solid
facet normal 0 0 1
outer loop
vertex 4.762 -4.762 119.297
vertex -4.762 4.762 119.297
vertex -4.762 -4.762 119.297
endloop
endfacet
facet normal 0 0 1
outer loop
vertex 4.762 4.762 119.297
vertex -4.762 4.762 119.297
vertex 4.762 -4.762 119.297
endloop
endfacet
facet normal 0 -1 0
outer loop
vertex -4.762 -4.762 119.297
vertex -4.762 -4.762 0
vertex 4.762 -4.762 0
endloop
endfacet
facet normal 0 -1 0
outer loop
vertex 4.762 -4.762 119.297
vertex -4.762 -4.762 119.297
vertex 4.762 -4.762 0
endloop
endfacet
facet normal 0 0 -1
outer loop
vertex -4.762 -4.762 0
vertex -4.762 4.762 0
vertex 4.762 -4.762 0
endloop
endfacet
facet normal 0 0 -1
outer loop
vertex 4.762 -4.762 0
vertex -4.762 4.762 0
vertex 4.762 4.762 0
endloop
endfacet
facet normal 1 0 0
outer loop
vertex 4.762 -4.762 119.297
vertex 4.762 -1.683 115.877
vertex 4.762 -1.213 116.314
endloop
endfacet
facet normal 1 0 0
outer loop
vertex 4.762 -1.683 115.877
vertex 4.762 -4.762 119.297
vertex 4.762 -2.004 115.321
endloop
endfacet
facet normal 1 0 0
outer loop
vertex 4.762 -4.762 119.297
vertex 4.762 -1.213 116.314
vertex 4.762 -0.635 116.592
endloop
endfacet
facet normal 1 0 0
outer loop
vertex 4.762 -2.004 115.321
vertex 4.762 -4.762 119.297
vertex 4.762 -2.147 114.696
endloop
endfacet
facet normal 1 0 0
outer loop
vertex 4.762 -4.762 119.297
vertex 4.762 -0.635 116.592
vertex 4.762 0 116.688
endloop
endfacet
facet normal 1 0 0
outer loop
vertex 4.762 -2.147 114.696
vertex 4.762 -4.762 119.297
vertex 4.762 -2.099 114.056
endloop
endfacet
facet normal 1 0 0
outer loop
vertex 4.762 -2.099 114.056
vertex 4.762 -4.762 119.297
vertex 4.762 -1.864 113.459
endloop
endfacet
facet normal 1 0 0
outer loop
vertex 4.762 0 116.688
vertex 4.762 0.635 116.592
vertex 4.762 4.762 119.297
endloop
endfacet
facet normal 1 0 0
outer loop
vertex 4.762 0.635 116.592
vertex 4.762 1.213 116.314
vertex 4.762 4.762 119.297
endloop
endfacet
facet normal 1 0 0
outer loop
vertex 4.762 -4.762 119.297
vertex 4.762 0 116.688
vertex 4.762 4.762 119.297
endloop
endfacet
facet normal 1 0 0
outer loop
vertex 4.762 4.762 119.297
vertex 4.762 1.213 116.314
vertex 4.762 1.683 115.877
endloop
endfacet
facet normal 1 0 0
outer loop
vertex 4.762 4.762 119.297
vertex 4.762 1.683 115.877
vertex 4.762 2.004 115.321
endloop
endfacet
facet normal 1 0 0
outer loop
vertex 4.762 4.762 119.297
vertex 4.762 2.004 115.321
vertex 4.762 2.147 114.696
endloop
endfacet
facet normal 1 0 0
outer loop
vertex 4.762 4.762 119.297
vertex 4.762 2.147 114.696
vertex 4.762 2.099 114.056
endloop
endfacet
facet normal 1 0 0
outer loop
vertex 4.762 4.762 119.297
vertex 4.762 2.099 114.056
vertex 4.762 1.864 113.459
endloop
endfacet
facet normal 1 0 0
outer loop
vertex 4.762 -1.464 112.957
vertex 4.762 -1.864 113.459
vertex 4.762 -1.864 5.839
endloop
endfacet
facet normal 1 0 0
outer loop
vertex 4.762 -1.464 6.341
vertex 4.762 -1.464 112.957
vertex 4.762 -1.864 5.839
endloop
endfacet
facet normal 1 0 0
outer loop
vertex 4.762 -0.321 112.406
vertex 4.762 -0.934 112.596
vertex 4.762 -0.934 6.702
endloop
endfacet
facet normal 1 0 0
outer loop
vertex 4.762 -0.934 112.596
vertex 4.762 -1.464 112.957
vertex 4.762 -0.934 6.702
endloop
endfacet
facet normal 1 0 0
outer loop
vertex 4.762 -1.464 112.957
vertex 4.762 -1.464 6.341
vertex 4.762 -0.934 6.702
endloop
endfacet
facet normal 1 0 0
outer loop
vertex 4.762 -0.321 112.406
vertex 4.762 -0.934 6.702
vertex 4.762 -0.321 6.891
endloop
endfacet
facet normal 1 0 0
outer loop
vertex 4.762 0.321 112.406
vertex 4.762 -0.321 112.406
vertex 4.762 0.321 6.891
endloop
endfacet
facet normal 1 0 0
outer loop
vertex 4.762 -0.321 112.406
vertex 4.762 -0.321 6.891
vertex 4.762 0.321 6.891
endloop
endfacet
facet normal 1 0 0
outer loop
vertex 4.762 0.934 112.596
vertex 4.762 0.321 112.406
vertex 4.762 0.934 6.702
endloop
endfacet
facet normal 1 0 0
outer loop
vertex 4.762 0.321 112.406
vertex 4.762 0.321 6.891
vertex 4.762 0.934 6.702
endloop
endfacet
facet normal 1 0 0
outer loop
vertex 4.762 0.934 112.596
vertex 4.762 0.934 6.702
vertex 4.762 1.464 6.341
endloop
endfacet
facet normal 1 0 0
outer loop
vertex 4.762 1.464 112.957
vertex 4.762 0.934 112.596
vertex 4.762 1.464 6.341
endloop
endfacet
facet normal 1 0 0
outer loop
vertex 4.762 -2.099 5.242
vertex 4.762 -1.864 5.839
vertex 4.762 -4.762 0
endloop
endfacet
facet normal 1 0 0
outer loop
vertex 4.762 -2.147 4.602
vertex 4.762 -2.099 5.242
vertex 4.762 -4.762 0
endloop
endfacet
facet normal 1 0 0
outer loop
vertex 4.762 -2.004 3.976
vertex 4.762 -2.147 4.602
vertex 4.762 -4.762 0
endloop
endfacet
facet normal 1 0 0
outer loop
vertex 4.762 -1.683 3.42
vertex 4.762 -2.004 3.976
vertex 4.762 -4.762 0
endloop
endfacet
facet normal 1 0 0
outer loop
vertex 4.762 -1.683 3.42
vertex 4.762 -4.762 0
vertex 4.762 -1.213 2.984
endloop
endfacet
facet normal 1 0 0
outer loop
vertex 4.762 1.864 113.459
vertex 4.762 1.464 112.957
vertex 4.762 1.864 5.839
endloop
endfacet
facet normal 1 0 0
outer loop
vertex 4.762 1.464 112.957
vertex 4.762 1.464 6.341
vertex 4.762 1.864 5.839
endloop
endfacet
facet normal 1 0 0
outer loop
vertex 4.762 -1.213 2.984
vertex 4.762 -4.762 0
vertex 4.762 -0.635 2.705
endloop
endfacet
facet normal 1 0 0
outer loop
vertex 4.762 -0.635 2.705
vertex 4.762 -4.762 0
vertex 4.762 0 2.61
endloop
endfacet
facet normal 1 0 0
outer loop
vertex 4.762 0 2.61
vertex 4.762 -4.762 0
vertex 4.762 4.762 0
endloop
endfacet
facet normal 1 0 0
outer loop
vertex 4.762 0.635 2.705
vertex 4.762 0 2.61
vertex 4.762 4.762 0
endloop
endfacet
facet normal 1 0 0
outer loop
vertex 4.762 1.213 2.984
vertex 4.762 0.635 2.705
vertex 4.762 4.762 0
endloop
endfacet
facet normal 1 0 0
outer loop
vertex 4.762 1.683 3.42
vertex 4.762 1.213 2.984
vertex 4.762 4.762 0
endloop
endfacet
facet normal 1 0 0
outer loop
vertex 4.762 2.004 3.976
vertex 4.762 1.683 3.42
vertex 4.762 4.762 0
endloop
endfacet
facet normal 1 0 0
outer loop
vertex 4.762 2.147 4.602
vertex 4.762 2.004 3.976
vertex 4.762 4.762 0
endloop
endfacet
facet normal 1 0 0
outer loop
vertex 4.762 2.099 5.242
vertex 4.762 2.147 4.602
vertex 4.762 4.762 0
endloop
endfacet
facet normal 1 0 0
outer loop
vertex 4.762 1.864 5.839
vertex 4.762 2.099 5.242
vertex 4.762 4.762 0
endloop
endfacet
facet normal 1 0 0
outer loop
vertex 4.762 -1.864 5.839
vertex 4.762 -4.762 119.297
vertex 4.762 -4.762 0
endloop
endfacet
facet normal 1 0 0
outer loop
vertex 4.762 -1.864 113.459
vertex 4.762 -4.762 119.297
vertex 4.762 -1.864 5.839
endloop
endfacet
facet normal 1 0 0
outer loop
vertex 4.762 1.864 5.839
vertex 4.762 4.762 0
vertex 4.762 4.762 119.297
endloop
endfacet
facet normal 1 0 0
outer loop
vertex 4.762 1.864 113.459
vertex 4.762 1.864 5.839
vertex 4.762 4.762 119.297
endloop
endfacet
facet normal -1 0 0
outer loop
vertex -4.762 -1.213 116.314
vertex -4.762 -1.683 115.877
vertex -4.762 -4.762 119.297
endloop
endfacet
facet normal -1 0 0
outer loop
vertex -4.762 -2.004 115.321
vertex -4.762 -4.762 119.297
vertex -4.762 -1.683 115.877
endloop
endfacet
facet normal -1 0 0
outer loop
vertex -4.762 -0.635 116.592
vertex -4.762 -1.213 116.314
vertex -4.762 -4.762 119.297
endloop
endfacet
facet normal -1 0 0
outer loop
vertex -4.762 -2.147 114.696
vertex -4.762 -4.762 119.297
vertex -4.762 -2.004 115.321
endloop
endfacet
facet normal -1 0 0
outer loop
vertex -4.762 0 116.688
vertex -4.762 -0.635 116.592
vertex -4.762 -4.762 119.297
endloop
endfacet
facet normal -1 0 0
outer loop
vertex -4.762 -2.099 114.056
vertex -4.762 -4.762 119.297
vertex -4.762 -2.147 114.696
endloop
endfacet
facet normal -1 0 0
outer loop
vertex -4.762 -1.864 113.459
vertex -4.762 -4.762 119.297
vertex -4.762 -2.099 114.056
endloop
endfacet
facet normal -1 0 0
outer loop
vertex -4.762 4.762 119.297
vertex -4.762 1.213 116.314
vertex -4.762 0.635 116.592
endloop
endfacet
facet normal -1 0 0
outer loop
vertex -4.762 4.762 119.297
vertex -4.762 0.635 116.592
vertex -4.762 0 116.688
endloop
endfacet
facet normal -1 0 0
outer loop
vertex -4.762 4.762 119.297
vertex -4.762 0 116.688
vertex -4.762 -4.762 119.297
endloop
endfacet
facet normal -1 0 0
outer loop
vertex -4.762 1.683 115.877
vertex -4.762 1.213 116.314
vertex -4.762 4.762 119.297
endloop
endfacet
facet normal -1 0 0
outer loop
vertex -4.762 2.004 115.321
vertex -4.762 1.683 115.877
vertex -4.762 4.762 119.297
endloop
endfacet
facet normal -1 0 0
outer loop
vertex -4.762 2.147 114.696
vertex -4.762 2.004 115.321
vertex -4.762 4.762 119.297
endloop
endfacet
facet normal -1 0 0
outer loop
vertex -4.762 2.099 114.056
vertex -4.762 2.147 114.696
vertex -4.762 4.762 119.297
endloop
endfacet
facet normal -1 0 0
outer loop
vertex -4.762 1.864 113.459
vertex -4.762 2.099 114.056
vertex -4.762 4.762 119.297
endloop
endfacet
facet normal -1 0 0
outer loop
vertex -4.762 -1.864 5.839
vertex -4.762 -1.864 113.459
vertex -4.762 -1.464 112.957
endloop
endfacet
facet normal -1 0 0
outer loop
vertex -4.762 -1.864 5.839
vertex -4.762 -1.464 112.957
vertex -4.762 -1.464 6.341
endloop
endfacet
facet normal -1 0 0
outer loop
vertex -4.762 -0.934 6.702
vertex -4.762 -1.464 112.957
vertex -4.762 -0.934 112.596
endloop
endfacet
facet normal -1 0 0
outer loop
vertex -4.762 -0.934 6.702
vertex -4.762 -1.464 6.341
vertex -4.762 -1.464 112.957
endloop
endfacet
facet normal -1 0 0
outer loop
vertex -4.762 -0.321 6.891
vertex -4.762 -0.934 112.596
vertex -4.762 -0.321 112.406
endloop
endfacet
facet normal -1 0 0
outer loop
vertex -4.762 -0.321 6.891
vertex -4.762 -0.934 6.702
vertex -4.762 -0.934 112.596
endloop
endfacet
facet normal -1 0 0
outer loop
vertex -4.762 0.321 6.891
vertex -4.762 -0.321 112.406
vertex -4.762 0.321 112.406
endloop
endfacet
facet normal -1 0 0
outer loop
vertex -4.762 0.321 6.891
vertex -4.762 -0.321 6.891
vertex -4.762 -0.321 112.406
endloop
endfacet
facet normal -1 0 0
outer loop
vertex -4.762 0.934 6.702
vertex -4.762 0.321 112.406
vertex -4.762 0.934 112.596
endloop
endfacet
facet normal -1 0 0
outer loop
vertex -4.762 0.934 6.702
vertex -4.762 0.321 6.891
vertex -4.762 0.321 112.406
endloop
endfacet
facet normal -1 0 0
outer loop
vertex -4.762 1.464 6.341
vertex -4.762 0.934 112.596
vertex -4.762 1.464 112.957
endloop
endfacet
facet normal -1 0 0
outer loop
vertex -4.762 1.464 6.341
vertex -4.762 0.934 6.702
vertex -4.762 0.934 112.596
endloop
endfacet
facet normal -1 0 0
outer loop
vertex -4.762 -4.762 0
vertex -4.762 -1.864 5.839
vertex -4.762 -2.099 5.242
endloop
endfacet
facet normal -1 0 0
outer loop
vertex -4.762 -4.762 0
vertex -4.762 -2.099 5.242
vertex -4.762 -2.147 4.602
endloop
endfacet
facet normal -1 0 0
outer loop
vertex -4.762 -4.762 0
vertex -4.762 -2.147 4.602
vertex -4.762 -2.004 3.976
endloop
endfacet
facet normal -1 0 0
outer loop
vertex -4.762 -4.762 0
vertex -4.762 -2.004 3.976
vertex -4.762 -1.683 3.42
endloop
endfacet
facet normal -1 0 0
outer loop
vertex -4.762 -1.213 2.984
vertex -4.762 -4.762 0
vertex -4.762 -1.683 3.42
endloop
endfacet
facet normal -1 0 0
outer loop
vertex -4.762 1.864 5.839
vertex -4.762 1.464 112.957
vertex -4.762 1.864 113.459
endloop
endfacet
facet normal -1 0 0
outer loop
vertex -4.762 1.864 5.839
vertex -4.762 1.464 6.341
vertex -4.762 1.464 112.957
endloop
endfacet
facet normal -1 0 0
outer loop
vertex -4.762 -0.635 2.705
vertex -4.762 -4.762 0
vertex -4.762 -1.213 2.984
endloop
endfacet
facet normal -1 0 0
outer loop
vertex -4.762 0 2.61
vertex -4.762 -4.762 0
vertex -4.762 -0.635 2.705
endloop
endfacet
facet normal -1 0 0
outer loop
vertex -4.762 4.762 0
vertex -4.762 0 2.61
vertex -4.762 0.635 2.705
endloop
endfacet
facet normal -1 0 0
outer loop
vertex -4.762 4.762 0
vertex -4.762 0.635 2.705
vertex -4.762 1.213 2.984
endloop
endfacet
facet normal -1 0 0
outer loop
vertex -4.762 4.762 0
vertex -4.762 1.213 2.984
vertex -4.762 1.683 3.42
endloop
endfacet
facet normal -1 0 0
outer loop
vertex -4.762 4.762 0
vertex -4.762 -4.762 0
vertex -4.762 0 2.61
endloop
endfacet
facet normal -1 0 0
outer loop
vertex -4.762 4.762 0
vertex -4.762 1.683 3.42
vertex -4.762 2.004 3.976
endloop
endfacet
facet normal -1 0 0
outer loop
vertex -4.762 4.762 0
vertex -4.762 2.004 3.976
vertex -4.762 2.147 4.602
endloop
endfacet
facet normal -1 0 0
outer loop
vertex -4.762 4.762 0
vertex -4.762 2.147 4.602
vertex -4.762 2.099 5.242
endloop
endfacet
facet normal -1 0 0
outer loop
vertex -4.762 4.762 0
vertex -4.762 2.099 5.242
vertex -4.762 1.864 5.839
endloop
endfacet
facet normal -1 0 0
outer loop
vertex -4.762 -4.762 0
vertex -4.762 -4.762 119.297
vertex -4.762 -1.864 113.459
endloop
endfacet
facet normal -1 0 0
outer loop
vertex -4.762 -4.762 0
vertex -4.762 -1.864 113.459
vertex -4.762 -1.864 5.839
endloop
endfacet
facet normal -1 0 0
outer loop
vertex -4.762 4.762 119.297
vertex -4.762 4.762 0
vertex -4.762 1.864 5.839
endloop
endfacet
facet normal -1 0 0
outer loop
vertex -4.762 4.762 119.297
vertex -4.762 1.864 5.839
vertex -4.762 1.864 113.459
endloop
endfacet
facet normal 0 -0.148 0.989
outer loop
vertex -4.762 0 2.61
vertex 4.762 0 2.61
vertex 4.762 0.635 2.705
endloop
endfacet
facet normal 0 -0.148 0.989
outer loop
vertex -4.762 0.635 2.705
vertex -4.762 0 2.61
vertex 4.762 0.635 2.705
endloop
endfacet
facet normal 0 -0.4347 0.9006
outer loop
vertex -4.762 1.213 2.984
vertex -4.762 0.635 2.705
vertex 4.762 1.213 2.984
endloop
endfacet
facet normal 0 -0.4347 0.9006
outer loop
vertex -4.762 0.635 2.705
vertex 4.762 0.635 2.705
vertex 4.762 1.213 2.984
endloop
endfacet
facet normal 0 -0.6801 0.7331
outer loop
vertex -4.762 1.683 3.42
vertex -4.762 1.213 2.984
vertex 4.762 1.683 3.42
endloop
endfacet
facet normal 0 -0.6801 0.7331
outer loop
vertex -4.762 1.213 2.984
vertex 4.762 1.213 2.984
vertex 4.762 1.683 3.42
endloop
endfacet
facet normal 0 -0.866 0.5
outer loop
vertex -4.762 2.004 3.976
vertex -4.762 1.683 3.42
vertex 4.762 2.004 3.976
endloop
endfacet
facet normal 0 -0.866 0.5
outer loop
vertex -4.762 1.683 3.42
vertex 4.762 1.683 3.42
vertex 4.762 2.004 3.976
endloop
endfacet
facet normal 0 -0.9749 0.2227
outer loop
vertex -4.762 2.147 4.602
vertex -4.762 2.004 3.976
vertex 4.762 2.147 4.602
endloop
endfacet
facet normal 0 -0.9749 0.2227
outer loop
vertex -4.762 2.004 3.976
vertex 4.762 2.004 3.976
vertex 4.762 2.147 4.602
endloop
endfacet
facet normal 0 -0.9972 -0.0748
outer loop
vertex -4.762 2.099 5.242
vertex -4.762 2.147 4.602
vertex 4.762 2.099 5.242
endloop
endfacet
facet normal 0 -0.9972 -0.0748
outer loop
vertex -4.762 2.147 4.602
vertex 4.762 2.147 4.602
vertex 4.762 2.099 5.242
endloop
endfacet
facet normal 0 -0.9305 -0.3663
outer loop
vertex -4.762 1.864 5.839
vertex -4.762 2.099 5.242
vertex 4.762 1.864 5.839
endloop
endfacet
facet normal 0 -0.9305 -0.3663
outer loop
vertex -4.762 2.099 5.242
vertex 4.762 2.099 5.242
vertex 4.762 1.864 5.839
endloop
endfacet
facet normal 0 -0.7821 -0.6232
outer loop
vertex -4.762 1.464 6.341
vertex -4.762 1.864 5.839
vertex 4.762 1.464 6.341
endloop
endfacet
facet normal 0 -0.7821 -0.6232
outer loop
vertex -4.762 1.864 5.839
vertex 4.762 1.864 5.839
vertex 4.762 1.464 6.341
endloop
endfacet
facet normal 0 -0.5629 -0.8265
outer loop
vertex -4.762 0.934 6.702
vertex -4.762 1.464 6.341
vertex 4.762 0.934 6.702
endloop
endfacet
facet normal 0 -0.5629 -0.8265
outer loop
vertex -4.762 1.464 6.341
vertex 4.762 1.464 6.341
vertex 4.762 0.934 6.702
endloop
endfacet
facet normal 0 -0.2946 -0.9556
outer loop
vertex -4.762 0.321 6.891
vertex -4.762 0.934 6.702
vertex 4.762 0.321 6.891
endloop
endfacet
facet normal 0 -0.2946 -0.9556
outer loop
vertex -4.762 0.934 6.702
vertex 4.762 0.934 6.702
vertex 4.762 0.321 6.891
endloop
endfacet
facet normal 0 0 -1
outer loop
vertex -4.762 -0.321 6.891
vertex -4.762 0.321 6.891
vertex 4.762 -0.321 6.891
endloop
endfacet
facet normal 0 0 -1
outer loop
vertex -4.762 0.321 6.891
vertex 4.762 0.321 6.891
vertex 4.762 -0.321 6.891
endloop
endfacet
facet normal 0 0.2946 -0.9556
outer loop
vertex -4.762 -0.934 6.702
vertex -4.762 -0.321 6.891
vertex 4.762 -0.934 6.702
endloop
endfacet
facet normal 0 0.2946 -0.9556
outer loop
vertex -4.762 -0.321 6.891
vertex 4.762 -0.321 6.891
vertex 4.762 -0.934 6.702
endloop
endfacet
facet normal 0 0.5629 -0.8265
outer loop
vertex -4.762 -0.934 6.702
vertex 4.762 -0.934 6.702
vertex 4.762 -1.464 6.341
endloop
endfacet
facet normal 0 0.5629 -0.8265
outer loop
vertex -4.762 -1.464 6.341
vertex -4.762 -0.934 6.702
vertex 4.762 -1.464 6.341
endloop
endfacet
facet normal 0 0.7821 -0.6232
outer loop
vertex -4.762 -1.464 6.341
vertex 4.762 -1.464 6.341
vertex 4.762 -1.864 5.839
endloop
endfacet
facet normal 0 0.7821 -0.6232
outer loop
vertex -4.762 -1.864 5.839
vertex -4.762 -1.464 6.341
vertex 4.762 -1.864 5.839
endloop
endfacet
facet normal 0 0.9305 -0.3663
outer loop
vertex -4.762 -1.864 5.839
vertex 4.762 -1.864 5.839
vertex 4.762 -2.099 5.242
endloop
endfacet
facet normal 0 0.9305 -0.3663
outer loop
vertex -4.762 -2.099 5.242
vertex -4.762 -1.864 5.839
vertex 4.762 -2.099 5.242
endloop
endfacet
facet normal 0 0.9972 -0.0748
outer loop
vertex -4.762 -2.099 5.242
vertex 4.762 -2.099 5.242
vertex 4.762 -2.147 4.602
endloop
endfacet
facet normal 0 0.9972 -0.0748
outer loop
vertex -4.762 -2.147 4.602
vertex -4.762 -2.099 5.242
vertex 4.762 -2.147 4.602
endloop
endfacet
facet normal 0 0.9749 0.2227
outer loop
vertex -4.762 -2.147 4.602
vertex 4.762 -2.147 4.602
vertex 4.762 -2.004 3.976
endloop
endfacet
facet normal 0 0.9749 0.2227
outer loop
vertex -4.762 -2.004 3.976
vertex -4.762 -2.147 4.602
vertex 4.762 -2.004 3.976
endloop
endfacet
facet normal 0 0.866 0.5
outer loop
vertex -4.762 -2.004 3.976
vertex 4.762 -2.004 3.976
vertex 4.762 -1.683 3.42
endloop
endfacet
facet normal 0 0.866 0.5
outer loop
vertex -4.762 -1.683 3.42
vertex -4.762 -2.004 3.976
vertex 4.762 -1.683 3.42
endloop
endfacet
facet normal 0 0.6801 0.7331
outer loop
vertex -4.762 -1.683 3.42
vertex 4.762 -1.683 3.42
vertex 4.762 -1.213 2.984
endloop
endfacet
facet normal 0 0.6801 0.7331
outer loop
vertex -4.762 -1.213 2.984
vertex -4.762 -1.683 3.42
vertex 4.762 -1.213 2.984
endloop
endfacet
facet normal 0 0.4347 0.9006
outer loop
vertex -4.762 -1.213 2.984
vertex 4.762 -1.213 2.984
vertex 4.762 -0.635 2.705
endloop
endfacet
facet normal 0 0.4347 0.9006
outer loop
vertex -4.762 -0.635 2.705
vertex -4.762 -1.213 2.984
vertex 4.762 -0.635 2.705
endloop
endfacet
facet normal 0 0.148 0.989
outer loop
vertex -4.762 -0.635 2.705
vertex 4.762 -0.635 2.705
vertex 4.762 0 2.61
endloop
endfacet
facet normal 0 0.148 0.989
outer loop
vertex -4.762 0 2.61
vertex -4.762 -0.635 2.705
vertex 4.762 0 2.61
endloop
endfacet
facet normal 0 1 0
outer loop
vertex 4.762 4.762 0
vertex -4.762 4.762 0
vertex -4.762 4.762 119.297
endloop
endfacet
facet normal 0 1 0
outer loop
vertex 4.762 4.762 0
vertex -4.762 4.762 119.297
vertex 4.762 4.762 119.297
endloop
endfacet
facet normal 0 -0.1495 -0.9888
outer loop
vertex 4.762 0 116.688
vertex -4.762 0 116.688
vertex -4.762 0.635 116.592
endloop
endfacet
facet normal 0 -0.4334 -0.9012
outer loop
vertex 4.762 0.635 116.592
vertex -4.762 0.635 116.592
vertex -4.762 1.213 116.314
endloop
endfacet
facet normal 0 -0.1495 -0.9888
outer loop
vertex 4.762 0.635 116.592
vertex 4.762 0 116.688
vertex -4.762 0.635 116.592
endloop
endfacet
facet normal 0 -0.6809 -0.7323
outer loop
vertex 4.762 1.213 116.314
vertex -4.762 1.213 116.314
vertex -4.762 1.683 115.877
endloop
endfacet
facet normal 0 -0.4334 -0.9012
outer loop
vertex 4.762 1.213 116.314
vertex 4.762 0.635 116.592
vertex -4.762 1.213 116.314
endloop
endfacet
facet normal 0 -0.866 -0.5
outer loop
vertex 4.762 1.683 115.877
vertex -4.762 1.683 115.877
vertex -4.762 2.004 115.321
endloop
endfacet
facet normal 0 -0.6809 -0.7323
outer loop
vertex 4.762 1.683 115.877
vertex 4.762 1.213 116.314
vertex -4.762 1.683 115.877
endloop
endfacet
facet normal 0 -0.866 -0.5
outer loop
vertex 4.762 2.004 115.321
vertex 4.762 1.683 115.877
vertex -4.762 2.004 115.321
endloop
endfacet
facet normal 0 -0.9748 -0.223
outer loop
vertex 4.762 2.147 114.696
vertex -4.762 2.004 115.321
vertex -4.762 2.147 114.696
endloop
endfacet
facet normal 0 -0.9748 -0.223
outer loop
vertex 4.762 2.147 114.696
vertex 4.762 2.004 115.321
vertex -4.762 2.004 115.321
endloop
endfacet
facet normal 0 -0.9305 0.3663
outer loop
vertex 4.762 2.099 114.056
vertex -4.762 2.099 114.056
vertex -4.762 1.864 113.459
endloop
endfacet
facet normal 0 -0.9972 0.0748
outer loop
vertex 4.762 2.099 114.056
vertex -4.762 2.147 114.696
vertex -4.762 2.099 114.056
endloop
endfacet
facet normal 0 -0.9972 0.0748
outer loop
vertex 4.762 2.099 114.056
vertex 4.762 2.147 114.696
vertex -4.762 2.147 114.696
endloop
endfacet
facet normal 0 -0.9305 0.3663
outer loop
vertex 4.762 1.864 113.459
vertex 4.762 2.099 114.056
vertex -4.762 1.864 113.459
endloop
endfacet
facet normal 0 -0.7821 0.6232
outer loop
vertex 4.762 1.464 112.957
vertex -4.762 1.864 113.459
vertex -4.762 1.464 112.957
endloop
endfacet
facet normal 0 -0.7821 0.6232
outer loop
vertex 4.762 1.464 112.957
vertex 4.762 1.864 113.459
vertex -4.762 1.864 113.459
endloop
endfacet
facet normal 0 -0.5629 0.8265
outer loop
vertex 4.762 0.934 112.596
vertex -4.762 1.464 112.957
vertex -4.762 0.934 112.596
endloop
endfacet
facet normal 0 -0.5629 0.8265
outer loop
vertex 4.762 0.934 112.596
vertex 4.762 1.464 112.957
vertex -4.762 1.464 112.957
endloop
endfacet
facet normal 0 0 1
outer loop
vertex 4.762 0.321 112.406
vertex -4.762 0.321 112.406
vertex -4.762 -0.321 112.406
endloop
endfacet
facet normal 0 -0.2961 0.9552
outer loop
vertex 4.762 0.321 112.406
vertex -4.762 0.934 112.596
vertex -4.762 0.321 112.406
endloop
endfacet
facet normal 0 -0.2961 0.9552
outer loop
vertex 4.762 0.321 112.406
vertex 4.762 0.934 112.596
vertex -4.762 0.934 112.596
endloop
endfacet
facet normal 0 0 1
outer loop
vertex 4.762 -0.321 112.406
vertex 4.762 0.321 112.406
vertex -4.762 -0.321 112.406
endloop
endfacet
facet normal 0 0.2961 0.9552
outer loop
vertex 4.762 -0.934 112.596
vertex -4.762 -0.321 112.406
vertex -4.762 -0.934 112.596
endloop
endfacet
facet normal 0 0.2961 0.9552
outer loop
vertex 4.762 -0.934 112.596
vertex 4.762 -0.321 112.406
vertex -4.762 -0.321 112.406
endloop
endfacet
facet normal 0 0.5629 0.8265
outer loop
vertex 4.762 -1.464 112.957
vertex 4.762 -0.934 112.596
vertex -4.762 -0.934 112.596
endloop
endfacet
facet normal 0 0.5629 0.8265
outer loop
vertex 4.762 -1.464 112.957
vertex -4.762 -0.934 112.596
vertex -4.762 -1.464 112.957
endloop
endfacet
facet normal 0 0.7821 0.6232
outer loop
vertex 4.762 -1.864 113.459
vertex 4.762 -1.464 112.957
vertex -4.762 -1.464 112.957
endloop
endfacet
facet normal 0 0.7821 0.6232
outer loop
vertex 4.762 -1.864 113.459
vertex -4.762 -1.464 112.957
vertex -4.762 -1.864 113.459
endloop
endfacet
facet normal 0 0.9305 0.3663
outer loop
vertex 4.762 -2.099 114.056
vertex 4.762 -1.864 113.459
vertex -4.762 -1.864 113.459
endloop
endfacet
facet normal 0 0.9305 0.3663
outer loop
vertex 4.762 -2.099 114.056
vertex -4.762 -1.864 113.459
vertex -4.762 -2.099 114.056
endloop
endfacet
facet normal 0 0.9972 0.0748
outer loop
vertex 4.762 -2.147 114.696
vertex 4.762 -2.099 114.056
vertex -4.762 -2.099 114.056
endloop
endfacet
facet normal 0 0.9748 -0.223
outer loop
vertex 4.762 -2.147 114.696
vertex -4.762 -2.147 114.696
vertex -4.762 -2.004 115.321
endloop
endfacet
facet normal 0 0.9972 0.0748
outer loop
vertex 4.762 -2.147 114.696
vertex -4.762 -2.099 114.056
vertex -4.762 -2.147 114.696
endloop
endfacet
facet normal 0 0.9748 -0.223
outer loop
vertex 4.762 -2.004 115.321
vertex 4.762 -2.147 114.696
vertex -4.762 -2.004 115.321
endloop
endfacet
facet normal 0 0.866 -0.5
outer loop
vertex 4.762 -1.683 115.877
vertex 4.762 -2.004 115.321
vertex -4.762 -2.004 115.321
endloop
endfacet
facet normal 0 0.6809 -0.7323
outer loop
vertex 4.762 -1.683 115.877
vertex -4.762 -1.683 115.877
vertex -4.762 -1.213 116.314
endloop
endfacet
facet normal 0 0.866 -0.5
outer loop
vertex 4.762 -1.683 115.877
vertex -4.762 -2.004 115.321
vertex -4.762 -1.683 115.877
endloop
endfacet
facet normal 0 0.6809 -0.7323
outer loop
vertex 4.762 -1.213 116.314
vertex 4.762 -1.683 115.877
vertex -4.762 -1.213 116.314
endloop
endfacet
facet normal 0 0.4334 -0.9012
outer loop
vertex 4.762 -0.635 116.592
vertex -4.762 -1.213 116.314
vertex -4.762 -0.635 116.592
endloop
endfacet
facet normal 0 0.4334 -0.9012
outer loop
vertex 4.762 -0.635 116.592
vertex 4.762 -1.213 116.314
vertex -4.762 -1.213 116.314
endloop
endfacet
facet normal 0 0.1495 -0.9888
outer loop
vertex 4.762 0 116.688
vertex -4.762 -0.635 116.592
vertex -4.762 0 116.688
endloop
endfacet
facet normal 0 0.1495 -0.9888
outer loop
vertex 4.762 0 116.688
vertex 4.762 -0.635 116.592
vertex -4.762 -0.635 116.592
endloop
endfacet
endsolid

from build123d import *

# Parameters (mm, degrees)
SKETCH1_W           = 9.525
SKETCH1_H           = 9.525
BOSS_EXTRUDE1_DEPTH = 119.297492001
SKETCH3_R           = 2.15265
CUT_EXTRUDE1_DEPTH  = 10.525


with BuildPart() as part:
    # Sketch1 → Boss-Extrude1 (new body)
    with BuildSketch(Plane.XY):
        Rectangle(SKETCH1_W, SKETCH1_H)
    extrude(amount=BOSS_EXTRUDE1_DEPTH)

    # Sketch3 → Cut-Extrude1 (cut, through all)
    with BuildSketch(Plane(origin=(4.7625, 0, 0), x_dir=(0, 0, -1), z_dir=(1, 0, 0))):
        with Locations((-4.7625, 0)):
            Circle(SKETCH3_R)
    cut_extrude1 = extrude(amount=-CUT_EXTRUDE1_DEPTH, mode=Mode.SUBTRACT)

    # Mirror1: Cut-Extrude1 across plane
    add(cut_extrude1.mirror(Plane(origin=(0, 0, 59.648746), x_dir=(1, 0, 0), z_dir=(0, 0, -1))), mode=Mode.SUBTRACT)


solid = part.part
